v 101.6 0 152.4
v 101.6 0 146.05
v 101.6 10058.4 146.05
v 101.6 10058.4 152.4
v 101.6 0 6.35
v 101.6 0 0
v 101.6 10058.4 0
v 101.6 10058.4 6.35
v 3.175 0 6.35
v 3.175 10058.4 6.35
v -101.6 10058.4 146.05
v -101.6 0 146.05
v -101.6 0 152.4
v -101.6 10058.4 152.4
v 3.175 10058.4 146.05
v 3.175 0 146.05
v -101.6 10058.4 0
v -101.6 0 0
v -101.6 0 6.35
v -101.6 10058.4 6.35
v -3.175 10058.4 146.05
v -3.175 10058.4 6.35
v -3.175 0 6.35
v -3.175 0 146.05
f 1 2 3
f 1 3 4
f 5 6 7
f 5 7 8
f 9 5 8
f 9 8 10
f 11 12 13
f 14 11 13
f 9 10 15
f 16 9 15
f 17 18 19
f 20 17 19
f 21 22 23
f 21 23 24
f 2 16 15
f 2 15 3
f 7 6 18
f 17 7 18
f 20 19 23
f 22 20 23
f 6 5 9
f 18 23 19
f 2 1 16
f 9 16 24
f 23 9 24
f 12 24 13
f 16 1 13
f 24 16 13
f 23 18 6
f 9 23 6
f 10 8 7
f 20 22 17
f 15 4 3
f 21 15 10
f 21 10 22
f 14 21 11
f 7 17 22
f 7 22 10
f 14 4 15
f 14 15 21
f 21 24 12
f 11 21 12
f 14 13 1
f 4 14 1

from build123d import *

# Parameters (mm, degrees)
F1_DEPTH = 10058.4


with BuildPart() as f1:
    # F0 (on Front) → F1 (new body)
    with BuildSketch(Plane.XZ):
        Polygon((0, 152.4), (0, 0), (101.6, 0), (101.6, 6.35), (3.175, 6.35), (3.175, 146.05), (101.6, 146.05), (101.6, 152.4), align=None)
    extrude(amount=-F1_DEPTH)

    # F2: F1 across face


with BuildPart() as f1_1:
    add(f1.part)
    add(f1.part.mirror(Plane(origin=(0, 5029.2, 76.2), x_dir=(0, -1, 0), z_dir=(-1, 0, 0))))


solid = f1_1.part
